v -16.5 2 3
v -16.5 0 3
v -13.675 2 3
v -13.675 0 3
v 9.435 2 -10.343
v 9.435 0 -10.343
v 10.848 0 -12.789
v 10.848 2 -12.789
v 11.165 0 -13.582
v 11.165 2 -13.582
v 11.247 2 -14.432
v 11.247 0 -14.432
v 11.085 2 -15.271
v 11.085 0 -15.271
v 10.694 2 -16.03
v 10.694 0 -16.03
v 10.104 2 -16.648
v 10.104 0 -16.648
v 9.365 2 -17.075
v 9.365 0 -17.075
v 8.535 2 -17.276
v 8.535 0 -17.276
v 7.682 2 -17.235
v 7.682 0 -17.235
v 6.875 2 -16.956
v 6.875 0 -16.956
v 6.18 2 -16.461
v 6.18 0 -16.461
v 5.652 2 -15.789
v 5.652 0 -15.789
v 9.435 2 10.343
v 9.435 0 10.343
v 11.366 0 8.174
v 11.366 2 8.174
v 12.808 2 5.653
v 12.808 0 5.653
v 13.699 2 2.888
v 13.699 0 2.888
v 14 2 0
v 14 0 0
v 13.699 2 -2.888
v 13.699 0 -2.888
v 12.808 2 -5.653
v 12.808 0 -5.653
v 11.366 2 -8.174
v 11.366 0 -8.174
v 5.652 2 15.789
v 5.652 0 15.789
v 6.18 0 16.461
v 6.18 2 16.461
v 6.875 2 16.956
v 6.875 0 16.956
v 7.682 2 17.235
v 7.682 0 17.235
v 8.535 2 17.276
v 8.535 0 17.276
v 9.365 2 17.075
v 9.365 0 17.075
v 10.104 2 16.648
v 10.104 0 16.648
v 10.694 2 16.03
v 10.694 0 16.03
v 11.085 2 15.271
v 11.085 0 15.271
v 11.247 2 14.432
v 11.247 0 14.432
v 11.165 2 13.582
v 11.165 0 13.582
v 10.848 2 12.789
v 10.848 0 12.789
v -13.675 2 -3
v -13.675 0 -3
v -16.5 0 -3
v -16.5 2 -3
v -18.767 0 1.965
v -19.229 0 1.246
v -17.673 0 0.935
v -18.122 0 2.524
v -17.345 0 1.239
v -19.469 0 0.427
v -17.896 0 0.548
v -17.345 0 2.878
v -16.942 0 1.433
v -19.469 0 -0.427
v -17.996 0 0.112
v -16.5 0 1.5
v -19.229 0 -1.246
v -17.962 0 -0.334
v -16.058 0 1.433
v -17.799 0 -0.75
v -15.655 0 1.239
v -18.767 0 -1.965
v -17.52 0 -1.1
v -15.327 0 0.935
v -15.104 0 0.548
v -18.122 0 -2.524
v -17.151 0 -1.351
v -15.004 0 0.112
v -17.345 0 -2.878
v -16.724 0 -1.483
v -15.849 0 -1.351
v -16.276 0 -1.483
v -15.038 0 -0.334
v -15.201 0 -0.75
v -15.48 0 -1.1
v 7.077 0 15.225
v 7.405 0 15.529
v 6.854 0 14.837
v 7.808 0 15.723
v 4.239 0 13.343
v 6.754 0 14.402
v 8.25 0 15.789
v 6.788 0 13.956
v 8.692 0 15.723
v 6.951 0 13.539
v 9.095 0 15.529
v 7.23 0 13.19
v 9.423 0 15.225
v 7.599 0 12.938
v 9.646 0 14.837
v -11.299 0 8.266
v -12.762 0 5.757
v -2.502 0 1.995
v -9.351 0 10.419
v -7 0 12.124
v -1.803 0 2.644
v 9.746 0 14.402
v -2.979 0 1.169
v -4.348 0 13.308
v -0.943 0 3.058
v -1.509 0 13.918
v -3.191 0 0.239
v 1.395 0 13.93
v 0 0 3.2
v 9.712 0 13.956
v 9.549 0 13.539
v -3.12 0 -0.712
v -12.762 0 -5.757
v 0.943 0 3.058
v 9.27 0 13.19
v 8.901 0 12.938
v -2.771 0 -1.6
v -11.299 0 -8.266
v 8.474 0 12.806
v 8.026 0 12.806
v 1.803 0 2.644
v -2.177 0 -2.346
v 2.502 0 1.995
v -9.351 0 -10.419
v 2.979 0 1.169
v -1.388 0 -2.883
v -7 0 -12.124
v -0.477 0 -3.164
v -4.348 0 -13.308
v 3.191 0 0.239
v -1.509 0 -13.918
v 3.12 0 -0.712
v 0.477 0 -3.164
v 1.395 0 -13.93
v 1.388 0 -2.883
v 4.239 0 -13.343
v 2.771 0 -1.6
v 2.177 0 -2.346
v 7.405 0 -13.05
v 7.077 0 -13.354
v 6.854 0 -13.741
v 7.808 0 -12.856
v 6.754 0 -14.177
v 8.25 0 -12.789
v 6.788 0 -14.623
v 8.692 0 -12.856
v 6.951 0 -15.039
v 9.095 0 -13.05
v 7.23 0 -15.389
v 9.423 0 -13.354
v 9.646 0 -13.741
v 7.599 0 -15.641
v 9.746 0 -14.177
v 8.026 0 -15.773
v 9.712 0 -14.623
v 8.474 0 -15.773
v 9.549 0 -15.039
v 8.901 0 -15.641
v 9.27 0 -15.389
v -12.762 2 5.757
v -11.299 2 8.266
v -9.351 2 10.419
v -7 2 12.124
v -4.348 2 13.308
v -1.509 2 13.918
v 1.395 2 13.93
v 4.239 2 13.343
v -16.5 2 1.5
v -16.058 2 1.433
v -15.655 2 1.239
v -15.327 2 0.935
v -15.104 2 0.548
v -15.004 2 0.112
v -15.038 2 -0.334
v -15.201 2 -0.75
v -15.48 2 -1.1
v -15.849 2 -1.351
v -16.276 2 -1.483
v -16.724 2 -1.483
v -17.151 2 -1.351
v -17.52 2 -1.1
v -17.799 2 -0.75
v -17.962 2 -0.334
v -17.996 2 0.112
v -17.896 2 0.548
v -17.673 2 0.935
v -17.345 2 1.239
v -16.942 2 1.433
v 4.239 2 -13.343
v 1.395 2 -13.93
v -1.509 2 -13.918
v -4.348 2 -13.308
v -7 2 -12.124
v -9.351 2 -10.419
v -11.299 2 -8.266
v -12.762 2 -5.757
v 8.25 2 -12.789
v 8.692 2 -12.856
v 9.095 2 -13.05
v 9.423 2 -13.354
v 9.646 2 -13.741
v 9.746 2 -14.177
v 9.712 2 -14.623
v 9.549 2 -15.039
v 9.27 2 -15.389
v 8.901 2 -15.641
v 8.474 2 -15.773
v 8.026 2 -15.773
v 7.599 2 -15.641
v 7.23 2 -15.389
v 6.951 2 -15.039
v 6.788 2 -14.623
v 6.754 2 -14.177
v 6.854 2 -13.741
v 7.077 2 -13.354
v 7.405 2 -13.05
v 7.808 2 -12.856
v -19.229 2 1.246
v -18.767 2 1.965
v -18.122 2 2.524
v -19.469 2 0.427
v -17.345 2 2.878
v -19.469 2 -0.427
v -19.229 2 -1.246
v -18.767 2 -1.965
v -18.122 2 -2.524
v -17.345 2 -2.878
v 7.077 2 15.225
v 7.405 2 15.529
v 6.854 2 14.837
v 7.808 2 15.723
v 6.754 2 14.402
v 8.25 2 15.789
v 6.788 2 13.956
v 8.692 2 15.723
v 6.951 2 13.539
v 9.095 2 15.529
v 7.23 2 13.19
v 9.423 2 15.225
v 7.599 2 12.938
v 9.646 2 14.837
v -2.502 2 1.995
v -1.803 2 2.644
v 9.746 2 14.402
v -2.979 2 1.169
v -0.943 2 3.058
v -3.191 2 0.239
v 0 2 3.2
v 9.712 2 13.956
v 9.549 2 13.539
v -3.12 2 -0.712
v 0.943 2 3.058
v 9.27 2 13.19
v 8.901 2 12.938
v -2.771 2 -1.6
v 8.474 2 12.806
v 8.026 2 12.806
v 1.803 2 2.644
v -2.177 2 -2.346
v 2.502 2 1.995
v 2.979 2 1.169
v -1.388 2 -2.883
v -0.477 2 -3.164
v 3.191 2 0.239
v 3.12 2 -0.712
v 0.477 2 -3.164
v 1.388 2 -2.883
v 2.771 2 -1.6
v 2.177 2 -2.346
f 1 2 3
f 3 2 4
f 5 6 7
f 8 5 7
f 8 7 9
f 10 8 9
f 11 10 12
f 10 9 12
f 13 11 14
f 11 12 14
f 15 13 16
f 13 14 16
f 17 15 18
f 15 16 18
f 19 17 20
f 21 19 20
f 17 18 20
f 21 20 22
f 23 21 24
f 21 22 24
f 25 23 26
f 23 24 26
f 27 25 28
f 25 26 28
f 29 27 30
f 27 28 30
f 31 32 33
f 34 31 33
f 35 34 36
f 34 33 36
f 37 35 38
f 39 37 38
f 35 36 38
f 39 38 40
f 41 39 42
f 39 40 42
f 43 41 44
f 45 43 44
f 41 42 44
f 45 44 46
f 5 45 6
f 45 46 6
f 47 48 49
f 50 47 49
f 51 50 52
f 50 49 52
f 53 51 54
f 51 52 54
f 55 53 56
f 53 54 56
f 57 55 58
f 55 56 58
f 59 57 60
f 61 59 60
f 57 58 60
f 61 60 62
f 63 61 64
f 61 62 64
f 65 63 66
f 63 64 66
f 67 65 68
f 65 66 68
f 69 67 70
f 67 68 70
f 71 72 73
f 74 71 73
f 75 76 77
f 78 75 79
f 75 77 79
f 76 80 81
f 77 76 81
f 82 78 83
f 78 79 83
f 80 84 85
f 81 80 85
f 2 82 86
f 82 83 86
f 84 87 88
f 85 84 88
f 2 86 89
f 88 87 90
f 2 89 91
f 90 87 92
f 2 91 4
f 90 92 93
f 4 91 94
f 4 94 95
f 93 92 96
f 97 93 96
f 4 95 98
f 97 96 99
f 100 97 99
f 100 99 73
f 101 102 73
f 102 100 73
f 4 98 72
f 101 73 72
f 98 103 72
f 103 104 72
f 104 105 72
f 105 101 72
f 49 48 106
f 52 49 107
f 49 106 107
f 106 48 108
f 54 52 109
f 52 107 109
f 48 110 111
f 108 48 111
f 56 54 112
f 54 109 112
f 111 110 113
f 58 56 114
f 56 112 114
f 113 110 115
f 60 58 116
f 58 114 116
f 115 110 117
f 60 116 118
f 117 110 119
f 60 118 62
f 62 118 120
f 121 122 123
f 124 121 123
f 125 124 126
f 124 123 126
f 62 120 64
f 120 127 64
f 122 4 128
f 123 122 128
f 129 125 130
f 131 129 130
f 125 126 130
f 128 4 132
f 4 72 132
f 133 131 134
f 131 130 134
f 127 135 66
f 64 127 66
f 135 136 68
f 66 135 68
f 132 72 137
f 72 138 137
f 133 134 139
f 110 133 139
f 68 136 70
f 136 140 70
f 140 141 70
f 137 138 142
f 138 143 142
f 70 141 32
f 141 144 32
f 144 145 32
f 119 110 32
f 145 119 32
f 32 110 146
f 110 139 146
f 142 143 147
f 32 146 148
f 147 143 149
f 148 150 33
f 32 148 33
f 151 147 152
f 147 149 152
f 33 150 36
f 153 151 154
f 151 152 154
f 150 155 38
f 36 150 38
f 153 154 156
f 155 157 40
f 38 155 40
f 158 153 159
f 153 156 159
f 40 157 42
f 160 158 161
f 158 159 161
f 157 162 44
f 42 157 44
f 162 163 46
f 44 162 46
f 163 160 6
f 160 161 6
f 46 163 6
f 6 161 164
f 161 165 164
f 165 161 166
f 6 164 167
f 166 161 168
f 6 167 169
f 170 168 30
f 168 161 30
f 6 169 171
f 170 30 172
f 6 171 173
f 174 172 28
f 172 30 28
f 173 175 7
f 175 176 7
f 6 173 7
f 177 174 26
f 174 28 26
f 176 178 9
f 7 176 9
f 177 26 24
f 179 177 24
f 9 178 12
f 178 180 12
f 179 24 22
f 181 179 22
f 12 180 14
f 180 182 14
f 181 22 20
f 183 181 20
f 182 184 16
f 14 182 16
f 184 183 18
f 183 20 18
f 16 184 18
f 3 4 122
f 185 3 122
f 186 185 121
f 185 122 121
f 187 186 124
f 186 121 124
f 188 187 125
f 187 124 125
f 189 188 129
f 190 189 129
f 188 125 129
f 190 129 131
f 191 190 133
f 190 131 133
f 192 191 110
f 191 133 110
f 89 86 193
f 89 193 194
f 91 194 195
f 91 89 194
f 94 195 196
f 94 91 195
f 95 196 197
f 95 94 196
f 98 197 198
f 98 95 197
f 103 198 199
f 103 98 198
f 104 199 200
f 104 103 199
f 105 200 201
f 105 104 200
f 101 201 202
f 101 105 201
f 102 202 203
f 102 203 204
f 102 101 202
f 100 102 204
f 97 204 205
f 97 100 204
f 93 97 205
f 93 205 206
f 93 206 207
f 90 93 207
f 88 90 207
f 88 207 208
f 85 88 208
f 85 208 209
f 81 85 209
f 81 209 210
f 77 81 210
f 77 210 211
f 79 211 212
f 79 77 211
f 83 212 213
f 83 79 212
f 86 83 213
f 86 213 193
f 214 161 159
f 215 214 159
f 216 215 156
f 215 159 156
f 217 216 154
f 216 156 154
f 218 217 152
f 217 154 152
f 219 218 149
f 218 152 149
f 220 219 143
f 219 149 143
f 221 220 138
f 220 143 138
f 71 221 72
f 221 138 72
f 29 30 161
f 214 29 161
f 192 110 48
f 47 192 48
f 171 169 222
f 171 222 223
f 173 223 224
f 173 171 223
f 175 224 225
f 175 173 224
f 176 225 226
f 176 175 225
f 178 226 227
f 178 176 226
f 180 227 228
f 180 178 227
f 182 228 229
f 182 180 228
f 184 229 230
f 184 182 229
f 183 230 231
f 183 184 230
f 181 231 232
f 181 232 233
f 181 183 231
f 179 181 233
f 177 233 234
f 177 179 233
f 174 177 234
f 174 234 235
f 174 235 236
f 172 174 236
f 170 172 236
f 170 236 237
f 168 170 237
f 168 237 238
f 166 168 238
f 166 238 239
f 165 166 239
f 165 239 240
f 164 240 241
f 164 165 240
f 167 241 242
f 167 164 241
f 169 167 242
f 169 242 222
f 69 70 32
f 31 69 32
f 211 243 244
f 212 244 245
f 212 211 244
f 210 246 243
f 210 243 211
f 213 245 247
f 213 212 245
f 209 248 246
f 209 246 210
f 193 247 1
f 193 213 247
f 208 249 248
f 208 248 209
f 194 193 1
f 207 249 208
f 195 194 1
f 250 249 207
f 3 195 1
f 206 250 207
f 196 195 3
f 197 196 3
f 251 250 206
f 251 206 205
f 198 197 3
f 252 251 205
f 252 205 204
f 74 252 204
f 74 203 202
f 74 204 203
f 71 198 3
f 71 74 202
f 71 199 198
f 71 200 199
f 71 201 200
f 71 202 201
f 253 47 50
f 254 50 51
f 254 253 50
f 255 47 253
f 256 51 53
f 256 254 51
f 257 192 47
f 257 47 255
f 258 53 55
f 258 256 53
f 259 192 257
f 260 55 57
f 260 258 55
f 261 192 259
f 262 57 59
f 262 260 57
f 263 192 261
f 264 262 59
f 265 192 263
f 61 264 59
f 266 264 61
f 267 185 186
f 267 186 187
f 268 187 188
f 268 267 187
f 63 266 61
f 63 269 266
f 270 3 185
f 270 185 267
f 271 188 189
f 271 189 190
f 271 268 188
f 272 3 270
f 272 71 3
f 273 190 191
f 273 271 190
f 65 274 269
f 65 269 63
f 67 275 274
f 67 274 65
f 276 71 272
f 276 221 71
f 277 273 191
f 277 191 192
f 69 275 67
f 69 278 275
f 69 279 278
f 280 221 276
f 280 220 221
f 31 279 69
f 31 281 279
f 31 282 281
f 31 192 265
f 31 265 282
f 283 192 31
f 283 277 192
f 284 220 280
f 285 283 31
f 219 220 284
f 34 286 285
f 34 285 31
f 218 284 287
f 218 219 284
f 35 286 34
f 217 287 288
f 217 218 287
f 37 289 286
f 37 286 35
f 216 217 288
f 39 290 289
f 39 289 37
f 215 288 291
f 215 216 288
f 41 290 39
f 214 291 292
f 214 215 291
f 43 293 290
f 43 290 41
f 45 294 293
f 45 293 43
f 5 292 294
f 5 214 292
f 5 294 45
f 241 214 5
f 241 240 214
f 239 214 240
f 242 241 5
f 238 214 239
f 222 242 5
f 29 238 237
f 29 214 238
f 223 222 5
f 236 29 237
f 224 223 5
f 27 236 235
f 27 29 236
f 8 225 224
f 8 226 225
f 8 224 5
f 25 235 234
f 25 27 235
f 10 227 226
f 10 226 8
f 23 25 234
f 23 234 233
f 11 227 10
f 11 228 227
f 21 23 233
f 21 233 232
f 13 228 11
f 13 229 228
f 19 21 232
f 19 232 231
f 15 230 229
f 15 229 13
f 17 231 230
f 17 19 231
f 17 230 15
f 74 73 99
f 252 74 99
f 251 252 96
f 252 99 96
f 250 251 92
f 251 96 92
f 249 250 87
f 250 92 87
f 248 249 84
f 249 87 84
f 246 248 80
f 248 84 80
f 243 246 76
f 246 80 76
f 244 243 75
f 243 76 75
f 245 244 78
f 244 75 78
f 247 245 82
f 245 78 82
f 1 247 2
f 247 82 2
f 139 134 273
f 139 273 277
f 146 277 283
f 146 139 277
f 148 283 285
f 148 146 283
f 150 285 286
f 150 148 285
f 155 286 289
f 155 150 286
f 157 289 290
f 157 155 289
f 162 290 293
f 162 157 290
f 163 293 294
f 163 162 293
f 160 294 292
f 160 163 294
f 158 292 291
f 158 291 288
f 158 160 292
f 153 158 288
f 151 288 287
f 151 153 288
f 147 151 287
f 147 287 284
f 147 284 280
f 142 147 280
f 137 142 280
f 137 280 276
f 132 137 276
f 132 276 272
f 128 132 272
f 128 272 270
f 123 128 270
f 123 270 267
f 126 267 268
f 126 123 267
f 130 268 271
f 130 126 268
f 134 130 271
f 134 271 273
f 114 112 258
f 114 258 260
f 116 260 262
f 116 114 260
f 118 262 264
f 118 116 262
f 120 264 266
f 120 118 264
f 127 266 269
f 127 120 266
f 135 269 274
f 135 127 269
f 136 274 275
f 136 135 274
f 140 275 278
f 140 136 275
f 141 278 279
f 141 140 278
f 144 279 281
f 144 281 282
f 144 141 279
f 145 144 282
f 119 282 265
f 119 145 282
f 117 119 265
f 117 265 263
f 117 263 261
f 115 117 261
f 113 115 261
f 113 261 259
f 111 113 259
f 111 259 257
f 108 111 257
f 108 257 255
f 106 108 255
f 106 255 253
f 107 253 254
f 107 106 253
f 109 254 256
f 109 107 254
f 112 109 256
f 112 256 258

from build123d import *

# Parameters (mm, degrees)
SKETCH_1_R      = 1.5
SKETCH_1_R_2    = 3.2
EXTRUDE_1_DEPTH = 2


with BuildPart() as part:
    # 草图1 → 凸台-拉伸1 (new body)
    with BuildSketch(Plane(origin=(0, 0, 0), x_dir=(1, 0, 0), z_dir=(0, 1, 0))):
        with BuildLine():
            ThreePointArc((-16.5, 3), (-19.5, 0), (-16.5, -3))
            Line((-16.5, -3), (-13.674794331, -3))
            ThreePointArc((-13.674794331, -3), (-7, -12.124355653), (4.239320954, -13.342719282))
            Line((4.239320954, -13.342719282), (5.651923789, -15.789419162))
            ThreePointArc((5.651923789, -15.789419162), (9.75, -16.887495374), (10.848076211, -12.789419162))
            Line((10.848076211, -12.789419162), (9.435473377, -10.342719282))
            ThreePointArc((9.435473377, -10.342719282), (14, 0), (9.435473377, 10.342719282))
            Line((9.435473377, 10.342719282), (10.848076211, 12.789419162))
            ThreePointArc((10.848076211, 12.789419162), (9.75, 16.887495374), (5.651923789, 15.789419162))
            Line((5.651923789, 15.789419162), (4.239320954, 13.342719282))
            ThreePointArc((4.239320954, 13.342719282), (-7, 12.124355653), (-13.674794331, 3))
            Line((-13.674794331, 3), (-16.5, 3))
        make_face()
        with Locations(Location((-16.5, 0, 0), (0, 0, 270))):
            Circle(SKETCH_1_R, mode=Mode.SUBTRACT)
        with Locations(Location((8.25, -14.289419162, 0), (0, 0, 270))):
            Circle(SKETCH_1_R, mode=Mode.SUBTRACT)
        with Locations(Location((0, 0, 0), (0, 0, 270))):
            Circle(SKETCH_1_R_2, mode=Mode.SUBTRACT)
        with Locations(Location((8.25, 14.289419162, 0), (0, 0, 270))):
            Circle(SKETCH_1_R, mode=Mode.SUBTRACT)
    extrude(amount=EXTRUDE_1_DEPTH)


solid = part.part
